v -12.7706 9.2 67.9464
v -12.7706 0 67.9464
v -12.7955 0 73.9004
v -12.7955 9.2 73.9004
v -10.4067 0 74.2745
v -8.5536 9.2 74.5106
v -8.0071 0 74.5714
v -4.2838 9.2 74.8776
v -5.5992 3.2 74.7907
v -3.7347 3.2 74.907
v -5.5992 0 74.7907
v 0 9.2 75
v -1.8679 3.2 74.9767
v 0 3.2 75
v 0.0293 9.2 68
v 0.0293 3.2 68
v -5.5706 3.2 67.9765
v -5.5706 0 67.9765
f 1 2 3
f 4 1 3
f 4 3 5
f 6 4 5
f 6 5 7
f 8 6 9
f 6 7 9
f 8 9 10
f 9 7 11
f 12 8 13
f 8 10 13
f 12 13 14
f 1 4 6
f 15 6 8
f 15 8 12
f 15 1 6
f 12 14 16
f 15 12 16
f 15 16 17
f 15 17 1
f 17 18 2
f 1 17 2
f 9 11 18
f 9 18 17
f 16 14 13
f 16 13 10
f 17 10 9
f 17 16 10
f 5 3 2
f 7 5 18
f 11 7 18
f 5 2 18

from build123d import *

# Parameters (mm, degrees)
BLOCO_DEPTH            = 9.2
ESBO_O3_W              = 5.6
ESBO_O3_H              = 3.2
RASGO_DO_ENCAIXE_DEPTH = 18.034534118


with BuildPart() as part:
    # Esboço1 → Bloco (new body)
    with BuildSketch(Plane(origin=(0, 0, 0), x_dir=(1, 0, 0), z_dir=(0, 1, 0))):
        with BuildLine():
            Line((0, -75), (0.029321703, -68))
            Line((0.029321703, -68), (-12.770566003, -67.946383642))
            Line((-12.770566003, -67.946383642), (-12.795506441, -73.900439883))
            ThreePointArc((-12.795506441, -73.900439883), (-6.421331979, -74.724604352), (0, -75))
        make_face()
    extrude(amount=BLOCO_DEPTH)

    # Esboço3 → Rasgo do Encaixe (cut, through all)
    with BuildSketch(Plane(origin=(-0.284833888, 0, 67.99868406), x_dir=(-0.9999912270311377, 0, -0.0041887779553967395), z_dir=(0.0041887779553967395, 0, -0.9999912270311377))):
        with Locations((2.485841653, 1.6)):
            Rectangle(ESBO_O3_W, ESBO_O3_H)
    extrude(amount=-RASGO_DO_ENCAIXE_DEPTH, mode=Mode.SUBTRACT)


solid = part.part
